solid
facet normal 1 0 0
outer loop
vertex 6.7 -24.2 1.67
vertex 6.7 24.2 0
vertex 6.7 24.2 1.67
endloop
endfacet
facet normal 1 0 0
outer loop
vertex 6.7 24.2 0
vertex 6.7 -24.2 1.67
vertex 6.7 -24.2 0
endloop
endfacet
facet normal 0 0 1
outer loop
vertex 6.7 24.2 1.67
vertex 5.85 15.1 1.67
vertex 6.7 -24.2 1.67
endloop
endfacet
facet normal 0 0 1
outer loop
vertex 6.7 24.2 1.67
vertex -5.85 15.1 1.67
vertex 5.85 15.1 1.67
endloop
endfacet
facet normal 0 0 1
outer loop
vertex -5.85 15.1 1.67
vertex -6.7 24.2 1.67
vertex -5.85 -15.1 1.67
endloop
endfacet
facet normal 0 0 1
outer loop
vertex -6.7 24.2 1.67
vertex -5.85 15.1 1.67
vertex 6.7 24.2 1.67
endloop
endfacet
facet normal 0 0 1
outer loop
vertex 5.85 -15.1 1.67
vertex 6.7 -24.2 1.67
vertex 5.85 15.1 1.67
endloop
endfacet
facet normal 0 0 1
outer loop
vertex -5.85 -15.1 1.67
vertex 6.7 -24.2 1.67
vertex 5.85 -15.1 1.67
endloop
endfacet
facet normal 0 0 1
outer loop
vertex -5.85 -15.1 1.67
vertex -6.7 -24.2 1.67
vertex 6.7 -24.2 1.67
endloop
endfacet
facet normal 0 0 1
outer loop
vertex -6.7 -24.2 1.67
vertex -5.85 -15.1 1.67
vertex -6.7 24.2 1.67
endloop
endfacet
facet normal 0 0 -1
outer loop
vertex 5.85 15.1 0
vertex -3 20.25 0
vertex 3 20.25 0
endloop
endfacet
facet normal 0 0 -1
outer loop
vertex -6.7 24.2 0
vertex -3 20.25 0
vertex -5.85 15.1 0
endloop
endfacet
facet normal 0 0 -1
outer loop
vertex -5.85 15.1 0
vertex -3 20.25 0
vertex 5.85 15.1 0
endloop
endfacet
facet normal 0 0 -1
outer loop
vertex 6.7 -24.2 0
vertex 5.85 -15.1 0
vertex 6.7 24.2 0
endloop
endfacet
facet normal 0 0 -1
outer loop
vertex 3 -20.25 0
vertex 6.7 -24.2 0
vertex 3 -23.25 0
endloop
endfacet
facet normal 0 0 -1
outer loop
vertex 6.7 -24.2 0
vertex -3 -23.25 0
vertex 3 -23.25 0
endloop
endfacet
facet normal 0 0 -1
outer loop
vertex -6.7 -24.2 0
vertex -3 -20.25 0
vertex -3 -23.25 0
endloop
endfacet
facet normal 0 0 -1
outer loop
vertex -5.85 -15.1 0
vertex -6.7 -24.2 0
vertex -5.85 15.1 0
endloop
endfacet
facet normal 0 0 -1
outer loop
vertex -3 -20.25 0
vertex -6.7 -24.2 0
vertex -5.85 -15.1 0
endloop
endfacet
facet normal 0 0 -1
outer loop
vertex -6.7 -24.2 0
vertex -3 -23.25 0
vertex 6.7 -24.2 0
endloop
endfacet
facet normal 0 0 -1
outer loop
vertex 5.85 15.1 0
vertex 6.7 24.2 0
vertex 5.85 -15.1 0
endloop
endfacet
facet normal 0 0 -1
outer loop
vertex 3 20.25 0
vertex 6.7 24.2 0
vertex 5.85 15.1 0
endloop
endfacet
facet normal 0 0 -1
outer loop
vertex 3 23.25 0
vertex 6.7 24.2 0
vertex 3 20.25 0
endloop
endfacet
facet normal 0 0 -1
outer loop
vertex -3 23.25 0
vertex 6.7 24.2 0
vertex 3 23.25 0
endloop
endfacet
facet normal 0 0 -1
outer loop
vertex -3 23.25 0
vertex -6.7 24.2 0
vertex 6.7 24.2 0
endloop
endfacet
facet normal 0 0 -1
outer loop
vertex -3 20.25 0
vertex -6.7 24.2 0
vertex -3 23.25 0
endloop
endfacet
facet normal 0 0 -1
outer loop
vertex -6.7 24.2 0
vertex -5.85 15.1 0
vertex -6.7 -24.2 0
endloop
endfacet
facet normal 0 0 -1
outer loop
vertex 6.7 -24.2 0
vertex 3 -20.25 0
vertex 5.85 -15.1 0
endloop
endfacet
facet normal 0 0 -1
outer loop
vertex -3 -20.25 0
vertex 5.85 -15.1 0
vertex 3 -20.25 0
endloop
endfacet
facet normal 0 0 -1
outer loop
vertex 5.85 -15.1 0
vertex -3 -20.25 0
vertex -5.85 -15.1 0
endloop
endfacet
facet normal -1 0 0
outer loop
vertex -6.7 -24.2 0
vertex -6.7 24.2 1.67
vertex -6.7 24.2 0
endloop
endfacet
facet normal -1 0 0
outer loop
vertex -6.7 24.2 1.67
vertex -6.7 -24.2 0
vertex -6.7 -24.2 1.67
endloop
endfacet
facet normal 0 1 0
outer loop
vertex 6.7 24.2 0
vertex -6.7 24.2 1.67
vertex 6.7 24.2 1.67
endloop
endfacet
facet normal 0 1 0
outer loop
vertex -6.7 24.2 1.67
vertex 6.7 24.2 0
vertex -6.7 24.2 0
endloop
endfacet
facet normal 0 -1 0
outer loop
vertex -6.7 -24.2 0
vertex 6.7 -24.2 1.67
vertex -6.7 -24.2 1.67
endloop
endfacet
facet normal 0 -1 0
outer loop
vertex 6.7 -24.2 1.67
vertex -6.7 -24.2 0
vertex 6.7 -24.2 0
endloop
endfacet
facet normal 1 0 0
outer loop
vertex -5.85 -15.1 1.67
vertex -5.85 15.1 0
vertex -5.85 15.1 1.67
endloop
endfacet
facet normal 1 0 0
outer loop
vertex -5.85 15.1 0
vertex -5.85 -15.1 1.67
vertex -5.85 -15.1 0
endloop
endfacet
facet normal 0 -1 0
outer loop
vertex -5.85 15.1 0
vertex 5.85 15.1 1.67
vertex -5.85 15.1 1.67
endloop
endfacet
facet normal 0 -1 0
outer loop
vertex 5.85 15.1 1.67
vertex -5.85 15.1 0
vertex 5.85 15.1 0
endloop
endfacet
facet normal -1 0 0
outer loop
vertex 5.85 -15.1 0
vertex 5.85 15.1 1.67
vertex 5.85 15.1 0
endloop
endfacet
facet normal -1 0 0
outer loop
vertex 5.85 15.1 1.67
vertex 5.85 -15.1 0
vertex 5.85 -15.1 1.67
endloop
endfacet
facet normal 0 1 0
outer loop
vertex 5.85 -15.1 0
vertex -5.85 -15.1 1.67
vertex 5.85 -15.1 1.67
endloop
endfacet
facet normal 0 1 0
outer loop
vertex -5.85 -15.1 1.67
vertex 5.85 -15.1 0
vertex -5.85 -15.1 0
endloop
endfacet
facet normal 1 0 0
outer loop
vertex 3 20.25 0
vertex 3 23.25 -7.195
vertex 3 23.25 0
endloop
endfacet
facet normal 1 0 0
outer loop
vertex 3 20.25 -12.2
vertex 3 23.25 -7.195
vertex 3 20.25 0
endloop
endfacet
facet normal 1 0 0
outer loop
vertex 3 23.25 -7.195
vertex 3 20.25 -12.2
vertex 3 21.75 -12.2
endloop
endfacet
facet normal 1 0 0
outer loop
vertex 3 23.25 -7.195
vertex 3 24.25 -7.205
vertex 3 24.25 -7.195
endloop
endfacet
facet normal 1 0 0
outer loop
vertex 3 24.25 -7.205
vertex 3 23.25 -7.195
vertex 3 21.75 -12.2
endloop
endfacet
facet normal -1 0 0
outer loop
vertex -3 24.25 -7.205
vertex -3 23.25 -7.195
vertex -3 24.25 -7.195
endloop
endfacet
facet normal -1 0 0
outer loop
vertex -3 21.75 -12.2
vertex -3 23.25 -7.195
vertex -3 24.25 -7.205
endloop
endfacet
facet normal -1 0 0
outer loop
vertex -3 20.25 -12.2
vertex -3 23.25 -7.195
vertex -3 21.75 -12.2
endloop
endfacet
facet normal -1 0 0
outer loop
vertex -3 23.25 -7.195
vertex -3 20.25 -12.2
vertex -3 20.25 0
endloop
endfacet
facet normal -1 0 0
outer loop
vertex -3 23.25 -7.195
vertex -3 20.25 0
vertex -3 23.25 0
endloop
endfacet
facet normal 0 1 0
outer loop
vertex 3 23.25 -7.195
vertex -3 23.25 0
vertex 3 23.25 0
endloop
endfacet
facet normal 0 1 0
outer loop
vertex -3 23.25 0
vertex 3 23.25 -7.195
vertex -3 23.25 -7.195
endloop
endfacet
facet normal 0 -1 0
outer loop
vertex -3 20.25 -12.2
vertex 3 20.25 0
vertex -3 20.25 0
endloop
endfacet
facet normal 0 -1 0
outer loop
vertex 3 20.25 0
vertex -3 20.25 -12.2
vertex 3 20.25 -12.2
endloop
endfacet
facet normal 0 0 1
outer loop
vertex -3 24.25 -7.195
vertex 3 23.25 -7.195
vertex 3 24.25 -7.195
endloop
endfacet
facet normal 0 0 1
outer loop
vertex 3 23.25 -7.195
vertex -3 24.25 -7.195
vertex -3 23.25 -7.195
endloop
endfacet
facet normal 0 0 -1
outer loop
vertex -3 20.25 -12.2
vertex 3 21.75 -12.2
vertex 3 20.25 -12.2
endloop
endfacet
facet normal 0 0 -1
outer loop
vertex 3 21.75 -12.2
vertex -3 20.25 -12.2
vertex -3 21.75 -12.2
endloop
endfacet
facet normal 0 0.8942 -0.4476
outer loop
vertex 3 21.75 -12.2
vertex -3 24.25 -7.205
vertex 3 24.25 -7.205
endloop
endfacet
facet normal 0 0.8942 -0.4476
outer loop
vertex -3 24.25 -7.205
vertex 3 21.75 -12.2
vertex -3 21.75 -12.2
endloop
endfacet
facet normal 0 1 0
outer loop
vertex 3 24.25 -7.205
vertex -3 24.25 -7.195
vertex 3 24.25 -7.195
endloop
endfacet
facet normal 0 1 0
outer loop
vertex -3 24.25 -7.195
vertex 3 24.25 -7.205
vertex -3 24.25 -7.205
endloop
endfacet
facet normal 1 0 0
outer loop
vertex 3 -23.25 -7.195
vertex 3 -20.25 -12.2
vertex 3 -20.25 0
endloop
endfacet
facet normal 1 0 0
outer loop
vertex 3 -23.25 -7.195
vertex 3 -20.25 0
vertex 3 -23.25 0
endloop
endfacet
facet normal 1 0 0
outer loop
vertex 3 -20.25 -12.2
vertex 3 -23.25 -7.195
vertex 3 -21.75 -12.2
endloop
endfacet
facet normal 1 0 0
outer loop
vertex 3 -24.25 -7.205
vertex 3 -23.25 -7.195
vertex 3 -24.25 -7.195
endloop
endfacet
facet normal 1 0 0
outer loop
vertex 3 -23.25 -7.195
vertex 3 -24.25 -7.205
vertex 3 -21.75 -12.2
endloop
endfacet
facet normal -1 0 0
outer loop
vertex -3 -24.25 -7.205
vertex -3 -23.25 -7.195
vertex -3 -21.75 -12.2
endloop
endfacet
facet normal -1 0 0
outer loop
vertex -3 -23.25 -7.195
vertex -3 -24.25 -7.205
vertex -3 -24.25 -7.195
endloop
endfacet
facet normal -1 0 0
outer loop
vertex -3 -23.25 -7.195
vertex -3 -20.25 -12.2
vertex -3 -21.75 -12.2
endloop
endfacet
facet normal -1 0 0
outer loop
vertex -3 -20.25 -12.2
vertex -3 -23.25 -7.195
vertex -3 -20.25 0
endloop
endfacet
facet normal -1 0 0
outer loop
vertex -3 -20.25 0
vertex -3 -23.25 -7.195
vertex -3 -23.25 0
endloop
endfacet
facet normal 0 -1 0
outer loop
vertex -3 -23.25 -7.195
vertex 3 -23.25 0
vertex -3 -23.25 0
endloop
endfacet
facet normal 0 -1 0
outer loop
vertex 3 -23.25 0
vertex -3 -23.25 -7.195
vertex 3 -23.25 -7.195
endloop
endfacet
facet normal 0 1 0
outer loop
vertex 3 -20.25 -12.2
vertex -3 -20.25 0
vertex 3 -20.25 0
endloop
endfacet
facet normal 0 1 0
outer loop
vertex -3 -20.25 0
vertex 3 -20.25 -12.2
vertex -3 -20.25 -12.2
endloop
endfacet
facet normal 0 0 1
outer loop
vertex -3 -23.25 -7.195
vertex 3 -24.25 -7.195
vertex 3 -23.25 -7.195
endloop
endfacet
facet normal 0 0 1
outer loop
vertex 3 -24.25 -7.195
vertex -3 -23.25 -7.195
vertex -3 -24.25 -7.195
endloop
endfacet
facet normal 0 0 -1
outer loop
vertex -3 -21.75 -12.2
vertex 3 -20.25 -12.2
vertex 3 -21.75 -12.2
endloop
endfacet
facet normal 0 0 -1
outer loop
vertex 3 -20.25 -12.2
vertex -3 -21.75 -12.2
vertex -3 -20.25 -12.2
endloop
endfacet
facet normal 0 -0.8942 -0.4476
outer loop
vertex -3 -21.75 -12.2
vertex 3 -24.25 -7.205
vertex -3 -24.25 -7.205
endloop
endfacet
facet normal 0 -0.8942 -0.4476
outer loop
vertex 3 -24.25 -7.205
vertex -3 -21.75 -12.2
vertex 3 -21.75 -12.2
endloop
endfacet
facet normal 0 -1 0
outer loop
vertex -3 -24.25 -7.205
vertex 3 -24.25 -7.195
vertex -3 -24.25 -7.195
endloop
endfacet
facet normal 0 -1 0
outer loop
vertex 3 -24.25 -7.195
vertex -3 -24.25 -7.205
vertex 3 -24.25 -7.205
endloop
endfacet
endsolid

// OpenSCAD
// Generated by SolidPython 1.1.3 on 2025-12-02 19:42:02


union() {
	difference() {
		translate(v = [0.0000000000, 0.0000000000, 0.8350000000]) {
			cube(center = true, size = [13.4000000000, 48.4000000000, 1.6700000000]);
		}
		translate(v = [0.0000000000, 0.0000000000, 1.6700000000]) {
			hull() {
				cube(center = true, size = [11.7000000000, 30.2000000000, 0.0100000000]);
				cube(center = true, size = [11.7000000000, 30.2000000000, 3.4235000000]);
			}
		}
	}
	translate(v = [0.0000000000, 21.7500000000, 0.0000000000]) {
		union() {
			translate(v = [0.0000000000, 0.0000000000, -3.6000000000]) {
				cube(center = true, size = [6.0000000000, 3.0000000000, 7.2000000000]);
			}
			translate(v = [0.0000000000, 0.5000000000, -7.2000000000]) {
				hull() {
					cube(center = true, size = [6.0000000000, 4.0000000000, 0.0100000000]);
					translate(v = [0.0000000000, -1.2500000000, -2.5000000000]) {
						cube(center = true, size = [6.0000000000, 1.5000000000, 5.0000000000]);
					}
				}
			}
		}
	}
	mirror(v = [0, 1, 0]) {
		translate(v = [0.0000000000, 21.7500000000, 0.0000000000]) {
			union() {
				translate(v = [0.0000000000, 0.0000000000, -3.6000000000]) {
					cube(center = true, size = [6.0000000000, 3.0000000000, 7.2000000000]);
				}
				translate(v = [0.0000000000, 0.5000000000, -7.2000000000]) {
					hull() {
						cube(center = true, size = [6.0000000000, 4.0000000000, 0.0100000000]);
						translate(v = [0.0000000000, -1.2500000000, -2.5000000000]) {
							cube(center = true, size = [6.0000000000, 1.5000000000, 5.0000000000]);
						}
					}
				}
			}
		}
	}
}
/***********************************************
*********      SolidPython code:      **********
************************************************
 
import solid as sl

debug_trace = False

def debugprint(info):
    if debug_trace:
        print(info)

def box(width, height, depth):
    return sl.cube([width, height, depth], center=True)


def cylinder(radius, height, segments=100):
    return sl.cylinder(r=radius, h=height, segments=segments, center=True)


def sphere(radius):
    return sl.sphere(radius)


def cone(r1, r2, height):
    return sl.cylinder(r1=r1, r2=r2, h=height)  # , center=True)


def rotate(shape, angle):
    if shape is None:
        return None
    return sl.rotate(angle)(shape)


def translate(shape, vector):
    if shape is None:
        return None
    return sl.translate(tuple(vector))(shape)


def mirror(shape, plane=None):
    debugprint('mirror()')
    planes = {
        'XY': [0, 0, 1],
        'YX': [0, 0, -1],
        'XZ': [0, 1, 0],
        'ZX': [0, -1, 0],
        'YZ': [1, 0, 0],
        'ZY': [-1, 0, 0],
    }
    return sl.mirror(planes[plane])(shape)


def union(shapes):
    debugprint('union()')
    shape = None
    for item in shapes:
        if item is not None:
            if shape is None:
                shape = item
            else:
                shape += item
    return shape


def add(shapes):
    debugprint('union()')
    shape = None
    for item in shapes:
        if item is not None:
            if shape is None:
                shape = item
            else:
                shape += item
    return shape


def difference(shape, shapes):
    debugprint('difference()')
    for item in shapes:
        if item is not None:
            shape -= item
    return shape


def intersect(shape1, shape2):
    if shape2 is not None:
        return sl.intersection()(shape1, shape2)
    else:
        return shape1

def hull_from_points(points):
    return sl.hull()(*points)


def hull_from_shapes(shapes, points=None):
    hs = []
    if points is not None:
        hs.extend(points)
    if shapes is not None:
        hs.extend(shapes)
    return sl.hull()(*hs)


def tess_hull(shapes, sl_tol=.5, sl_angTol=1):
    return sl.hull()(*shapes)


def triangle_hulls(shapes):
    debugprint('triangle_hulls()')
    hulls = []
    for i in range(len(shapes) - 2):
        hulls.append(hull_from_shapes(shapes[i: (i + 3)]))

    return union(hulls)



def bottom_hull(p, height=0.001):
    debugprint("bottom_hull()")
    shape = None
    for item in p:
        proj = sl.projection()(p)
        t_shape = sl.linear_extrude(height=height, twist=0, convexity=0, center=True)(
            proj
        )
        t_shape = sl.translate([0, 0, height / 2 - 10])(t_shape)
        if shape is None:
            shape = t_shape
        shape = sl.hull()(p, shape, t_shape)
    return shape

def polyline(point_list):
    return sl.polygon(point_list)


# def project_to_plate():
#     square = cq.Workplane('XY').rect(1000, 1000)
#     for wire in square.wires().objects:
#         plane = cq.Workplane('XY').add(cq.Face.makeFromWires(wire))

def extrude_poly(outer_poly, inner_polys=None, height=1):
    if inner_polys is not None:
        return sl.linear_extrude(height=height, twist=0, convexity=0, center=True)(outer_poly, *inner_polys)
    else:
        return sl.linear_extrude(height=height, twist=0, convexity=0, center=True)(outer_poly)


def import_file(fname, convexity=2):
    print("IMPORTING FROM {}".format(fname))
    return sl.import_stl(fname.replace("\\", "/") + ".stl", convexity=convexity)


def export_file(shape, fname):
    print("EXPORTING TO {}".format(fname))
    sl.scad_render_to_file(shape, fname + ".scad")


def export_dxf(shape, fname):
    print("NO DXF EXPORT FOR SOLID".format(fname))
    pass 
 
************************************************/
